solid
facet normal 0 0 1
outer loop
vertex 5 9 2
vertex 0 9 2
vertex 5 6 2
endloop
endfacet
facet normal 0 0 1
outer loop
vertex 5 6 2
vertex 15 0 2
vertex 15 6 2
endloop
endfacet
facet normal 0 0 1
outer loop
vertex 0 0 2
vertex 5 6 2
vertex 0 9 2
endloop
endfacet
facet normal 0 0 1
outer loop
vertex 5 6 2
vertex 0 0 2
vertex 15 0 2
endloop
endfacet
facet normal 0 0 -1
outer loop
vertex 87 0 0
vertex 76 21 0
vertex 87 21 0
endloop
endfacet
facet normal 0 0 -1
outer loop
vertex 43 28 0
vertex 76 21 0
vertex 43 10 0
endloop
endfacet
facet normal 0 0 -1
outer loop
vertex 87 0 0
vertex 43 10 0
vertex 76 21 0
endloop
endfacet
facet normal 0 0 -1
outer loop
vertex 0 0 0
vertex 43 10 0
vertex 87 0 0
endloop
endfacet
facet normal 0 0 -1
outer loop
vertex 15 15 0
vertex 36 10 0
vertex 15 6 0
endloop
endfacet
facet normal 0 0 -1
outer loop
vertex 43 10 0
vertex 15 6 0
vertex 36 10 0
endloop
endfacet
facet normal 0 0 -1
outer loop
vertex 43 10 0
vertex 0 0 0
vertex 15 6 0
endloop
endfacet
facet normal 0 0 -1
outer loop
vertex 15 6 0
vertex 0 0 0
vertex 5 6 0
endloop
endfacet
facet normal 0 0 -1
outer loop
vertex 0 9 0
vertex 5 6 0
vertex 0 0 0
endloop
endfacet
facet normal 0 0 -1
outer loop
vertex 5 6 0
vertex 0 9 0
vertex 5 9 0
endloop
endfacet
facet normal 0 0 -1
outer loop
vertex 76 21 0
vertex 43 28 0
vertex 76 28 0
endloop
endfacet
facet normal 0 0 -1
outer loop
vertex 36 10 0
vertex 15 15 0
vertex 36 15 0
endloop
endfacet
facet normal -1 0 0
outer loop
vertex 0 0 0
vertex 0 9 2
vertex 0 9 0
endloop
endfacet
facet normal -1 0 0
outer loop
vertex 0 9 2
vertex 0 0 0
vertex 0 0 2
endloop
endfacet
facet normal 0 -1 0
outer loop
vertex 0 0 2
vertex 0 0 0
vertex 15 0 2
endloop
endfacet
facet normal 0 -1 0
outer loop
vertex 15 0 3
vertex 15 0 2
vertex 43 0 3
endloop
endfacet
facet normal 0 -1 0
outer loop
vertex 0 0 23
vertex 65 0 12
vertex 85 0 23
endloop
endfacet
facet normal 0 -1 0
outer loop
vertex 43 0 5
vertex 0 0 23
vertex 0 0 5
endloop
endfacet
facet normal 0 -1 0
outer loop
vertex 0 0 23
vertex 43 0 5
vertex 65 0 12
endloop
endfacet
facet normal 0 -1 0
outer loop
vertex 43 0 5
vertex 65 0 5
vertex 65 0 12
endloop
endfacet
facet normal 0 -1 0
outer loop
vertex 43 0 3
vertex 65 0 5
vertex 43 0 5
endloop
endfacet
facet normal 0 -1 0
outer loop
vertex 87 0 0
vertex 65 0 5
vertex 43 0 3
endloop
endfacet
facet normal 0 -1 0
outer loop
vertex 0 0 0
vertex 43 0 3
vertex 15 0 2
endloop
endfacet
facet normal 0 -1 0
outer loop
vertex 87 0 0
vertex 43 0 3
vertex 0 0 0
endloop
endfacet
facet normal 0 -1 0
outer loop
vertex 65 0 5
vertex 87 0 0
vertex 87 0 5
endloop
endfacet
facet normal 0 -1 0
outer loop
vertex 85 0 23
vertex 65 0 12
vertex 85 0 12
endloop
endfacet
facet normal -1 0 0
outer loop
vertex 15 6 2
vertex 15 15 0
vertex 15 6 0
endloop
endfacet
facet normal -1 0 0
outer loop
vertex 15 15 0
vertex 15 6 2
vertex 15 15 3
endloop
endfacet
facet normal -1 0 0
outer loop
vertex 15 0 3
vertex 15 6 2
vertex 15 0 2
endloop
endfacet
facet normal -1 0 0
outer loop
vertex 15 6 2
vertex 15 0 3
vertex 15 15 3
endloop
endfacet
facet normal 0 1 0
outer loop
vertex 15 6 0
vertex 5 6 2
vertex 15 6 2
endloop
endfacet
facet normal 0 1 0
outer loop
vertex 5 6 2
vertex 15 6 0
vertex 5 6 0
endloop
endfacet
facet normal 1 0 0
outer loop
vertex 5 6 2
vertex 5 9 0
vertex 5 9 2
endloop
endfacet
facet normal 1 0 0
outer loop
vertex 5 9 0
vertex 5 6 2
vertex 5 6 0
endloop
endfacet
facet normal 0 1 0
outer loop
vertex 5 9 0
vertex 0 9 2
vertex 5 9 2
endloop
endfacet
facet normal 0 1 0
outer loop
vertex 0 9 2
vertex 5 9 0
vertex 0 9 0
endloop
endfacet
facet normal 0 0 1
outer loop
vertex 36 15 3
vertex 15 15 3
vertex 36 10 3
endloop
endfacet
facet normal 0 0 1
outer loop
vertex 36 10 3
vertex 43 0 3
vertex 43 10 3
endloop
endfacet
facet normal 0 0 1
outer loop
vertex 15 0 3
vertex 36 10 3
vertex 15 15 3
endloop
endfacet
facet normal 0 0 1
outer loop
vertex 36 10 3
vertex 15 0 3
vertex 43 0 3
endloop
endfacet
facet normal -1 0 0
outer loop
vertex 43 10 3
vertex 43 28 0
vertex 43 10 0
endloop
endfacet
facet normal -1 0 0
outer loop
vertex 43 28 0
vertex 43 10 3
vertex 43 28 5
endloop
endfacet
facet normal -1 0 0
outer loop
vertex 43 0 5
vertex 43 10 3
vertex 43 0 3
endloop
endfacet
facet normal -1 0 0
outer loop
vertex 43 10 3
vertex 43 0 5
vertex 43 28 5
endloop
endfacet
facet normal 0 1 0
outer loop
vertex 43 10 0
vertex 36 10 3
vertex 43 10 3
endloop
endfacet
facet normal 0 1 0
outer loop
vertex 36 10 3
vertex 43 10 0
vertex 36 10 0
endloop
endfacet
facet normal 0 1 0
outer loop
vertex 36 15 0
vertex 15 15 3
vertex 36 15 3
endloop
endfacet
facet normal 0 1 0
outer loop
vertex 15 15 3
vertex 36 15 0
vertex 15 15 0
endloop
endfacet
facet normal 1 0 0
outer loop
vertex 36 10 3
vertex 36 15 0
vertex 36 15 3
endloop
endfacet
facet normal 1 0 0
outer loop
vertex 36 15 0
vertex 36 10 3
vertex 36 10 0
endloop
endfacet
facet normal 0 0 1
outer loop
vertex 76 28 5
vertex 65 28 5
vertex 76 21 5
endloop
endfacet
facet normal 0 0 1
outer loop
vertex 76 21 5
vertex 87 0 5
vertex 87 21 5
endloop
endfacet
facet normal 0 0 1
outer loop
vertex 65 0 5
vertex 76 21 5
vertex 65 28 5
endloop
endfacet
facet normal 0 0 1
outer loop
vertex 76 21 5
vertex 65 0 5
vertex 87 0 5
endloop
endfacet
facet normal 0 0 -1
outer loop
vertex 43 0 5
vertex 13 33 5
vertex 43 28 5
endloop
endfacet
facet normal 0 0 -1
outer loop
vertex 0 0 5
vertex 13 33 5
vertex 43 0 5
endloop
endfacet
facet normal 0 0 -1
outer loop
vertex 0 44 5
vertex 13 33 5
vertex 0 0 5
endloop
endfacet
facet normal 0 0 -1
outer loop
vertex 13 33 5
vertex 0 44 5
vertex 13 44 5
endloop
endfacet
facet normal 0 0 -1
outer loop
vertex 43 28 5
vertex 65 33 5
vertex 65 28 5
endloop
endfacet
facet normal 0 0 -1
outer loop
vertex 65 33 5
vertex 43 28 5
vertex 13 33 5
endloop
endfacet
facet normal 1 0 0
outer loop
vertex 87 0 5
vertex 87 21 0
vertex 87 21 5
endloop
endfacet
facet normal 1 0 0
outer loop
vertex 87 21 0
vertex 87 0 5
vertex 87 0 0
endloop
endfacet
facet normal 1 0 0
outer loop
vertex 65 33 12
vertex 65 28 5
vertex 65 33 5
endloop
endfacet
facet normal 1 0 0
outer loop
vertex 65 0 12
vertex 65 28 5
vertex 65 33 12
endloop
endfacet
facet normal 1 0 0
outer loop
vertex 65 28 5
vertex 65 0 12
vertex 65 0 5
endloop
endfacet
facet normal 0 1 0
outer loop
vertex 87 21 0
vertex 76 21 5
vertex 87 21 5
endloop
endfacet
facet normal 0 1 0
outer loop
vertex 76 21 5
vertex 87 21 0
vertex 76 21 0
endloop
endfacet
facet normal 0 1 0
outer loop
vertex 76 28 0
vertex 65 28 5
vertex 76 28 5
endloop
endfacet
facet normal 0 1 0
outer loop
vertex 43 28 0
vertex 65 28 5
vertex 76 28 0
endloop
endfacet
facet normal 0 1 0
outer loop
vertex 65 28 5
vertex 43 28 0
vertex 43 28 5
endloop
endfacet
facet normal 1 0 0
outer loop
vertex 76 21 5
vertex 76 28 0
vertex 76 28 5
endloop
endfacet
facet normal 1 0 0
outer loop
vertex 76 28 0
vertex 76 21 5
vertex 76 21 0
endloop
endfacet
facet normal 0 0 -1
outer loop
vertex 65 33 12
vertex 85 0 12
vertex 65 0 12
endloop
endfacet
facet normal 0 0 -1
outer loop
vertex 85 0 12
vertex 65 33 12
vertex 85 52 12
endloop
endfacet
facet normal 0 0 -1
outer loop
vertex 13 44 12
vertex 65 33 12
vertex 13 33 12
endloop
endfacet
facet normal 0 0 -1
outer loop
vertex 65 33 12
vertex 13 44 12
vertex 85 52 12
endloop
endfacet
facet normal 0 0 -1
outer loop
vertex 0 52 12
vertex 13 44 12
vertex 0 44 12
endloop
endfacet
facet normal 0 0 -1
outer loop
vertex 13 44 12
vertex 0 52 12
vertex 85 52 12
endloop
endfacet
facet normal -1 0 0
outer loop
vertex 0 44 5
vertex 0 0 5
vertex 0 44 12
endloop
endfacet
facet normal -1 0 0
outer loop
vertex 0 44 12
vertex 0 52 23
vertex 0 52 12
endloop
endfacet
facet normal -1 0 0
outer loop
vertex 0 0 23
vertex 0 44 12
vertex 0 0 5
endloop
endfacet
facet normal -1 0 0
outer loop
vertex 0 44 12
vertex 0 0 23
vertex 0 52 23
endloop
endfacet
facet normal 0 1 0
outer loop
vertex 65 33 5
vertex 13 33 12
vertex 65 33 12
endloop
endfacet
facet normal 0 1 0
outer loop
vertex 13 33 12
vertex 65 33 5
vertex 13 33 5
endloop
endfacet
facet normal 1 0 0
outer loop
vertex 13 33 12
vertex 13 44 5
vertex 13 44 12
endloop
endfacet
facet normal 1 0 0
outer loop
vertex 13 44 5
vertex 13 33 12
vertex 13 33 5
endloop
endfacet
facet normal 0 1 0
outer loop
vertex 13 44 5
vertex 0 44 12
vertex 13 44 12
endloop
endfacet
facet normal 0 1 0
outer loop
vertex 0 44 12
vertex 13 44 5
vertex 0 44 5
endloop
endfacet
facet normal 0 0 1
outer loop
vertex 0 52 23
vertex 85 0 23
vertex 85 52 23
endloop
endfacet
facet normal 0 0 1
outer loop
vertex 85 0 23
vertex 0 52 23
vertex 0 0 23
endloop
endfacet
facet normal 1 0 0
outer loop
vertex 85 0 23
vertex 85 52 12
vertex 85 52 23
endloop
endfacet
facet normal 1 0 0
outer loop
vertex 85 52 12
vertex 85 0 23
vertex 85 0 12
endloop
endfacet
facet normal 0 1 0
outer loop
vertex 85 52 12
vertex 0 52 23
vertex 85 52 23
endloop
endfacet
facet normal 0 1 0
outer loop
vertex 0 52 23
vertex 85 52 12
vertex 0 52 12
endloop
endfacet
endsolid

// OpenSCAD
translate([2.5, 1.5, 1.0]) color([0.9720932443736168, 0.4226528937805498, 0.8924289339928592]) cube([5, 3, 2], center=true);
translate([7.5, 1.5, 1.0]) color([0.21652428395276402, 0.4352131794546169, 0.35803513461315506]) cube([5, 3, 2], center=true);
translate([12.5, 1.5, 1.0]) color([0.17693553603496914, 0.32881318575191665, 0.9867958186960467]) cube([5, 3, 2], center=true);
translate([2.5, 4.5, 1.0]) color([0.7473090097951195, 0.3826682791831585, 0.40928443439993156]) cube([5, 3, 2], center=true);
translate([7.5, 4.5, 1.0]) color([0.2637409011550663, 0.531336678598825, 0.7356369121419466]) cube([5, 3, 2], center=true);
translate([12.5, 4.5, 1.0]) color([0.686646615750601, 0.46264983534131954, 0.041939046716157]) cube([5, 3, 2], center=true);
translate([2.5, 7.5, 1.0]) color([0.9215078064992686, 0.4089338030960661, 0.3902988670119316]) cube([5, 3, 2], center=true);
translate([18.5, 2.5, 1.5]) color([0.0031101144891549914, 0.13822721408191307, 0.8688534175006787]) cube([7, 5, 3], center=true);
translate([25.5, 2.5, 1.5]) color([0.513934596181303, 0.7324348442226767, 0.14816788643335854]) cube([7, 5, 3], center=true);
translate([32.5, 2.5, 1.5]) color([0.33005100665524945, 0.8401365565378639, 0.8206585211774247]) cube([7, 5, 3], center=true);
translate([39.5, 2.5, 1.5]) color([0.2467942680862406, 0.021975308333072263, 0.8064669735456029]) cube([7, 5, 3], center=true);
translate([18.5, 7.5, 1.5]) color([0.16884400503942165, 0.7876813921208954, 0.6836592298851071]) cube([7, 5, 3], center=true);
translate([25.5, 7.5, 1.5]) color([0.1683147603108942, 0.0784886436699127, 0.9276494299222889]) cube([7, 5, 3], center=true);
translate([32.5, 7.5, 1.5]) color([0.5978783972833935, 0.620510173056511, 0.4575118028380537]) cube([7, 5, 3], center=true);
translate([39.5, 7.5, 1.5]) color([0.15007097732228858, 0.6019699129465877, 0.2524728800375037]) cube([7, 5, 3], center=true);
translate([18.5, 12.5, 1.5]) color([0.8058946560175415, 0.732718954805416, 0.027267185045511733]) cube([7, 5, 3], center=true);
translate([25.5, 12.5, 1.5]) color([0.9324230096450348, 0.03631604832667812, 0.0896193188307074]) cube([7, 5, 3], center=true);
translate([32.5, 12.5, 1.5]) color([0.2927345609042453, 0.1508090604701401, 0.2361450829166024]) cube([7, 5, 3], center=true);
translate([48.5, 3.5, 2.5]) color([0.3558094886115547, 0.7354997154547138, 0.4047113607648444]) cube([11, 7, 5], center=true);
translate([59.5, 3.5, 2.5]) color([0.2698397547254259, 0.4923131536276696, 0.39259324978876053]) cube([11, 7, 5], center=true);
translate([70.5, 3.5, 2.5]) color([0.310764197486207, 0.900541657866744, 0.5504484509596044]) cube([11, 7, 5], center=true);
translate([81.5, 3.5, 2.5]) color([0.9773275109747672, 0.7729124093934382, 0.570499297619577]) cube([11, 7, 5], center=true);
translate([48.5, 10.5, 2.5]) color([0.26244658927686404, 0.6868436562888387, 0.45591771896977173]) cube([11, 7, 5], center=true);
translate([59.5, 10.5, 2.5]) color([0.7213877150417534, 0.40377880891106155, 0.49600503631794757]) cube([11, 7, 5], center=true);
translate([70.5, 10.5, 2.5]) color([0.02068376744575562, 0.739958502320053, 0.03427354435563068]) cube([11, 7, 5], center=true);
translate([81.5, 10.5, 2.5]) color([0.6807253858476396, 0.5820036955379622, 0.7759176114881267]) cube([11, 7, 5], center=true);
translate([48.5, 17.5, 2.5]) color([0.28977759923741564, 0.6861108151233298, 0.20709797563103816]) cube([11, 7, 5], center=true);
translate([59.5, 17.5, 2.5]) color([0.5292720013578311, 0.34028037925118015, 0.9784545513570129]) cube([11, 7, 5], center=true);
translate([70.5, 17.5, 2.5]) color([0.9718665573793185, 0.20896973547336006, 0.5660382358858294]) cube([11, 7, 5], center=true);
translate([81.5, 17.5, 2.5]) color([0.3294426858782725, 0.9685381870202809, 0.9245259481865659]) cube([11, 7, 5], center=true);
translate([48.5, 24.5, 2.5]) color([0.5861458530564896, 0.7200844551084937, 0.6813247567090696]) cube([11, 7, 5], center=true);
translate([59.5, 24.5, 2.5]) color([0.353355632443361, 0.91636156937516, 0.899453536816357]) cube([11, 7, 5], center=true);
translate([70.5, 24.5, 2.5]) color([0.33065846447807934, 0.7473949106043586, 0.009092126674448586]) cube([11, 7, 5], center=true);
translate([6.5, 5.5, 8.5]) color([0.8163591105584419, 0.5648693453979996, 0.9523067127509502]) cube([13, 11, 7], center=true);
translate([19.5, 5.5, 8.5]) color([0.3631930745481745, 0.6257130749033707, 0.3230024315033787]) cube([13, 11, 7], center=true);
translate([32.5, 5.5, 8.5]) color([0.7827853814039997, 0.6007029967830003, 0.9874710229786893]) cube([13, 11, 7], center=true);
translate([45.5, 5.5, 8.5]) color([0.0010127930964535237, 0.14075874215813544, 0.043601382090813434]) cube([13, 11, 7], center=true);
translate([58.5, 5.5, 8.5]) color([0.1258478488128345, 0.9293852970698306, 0.9486082995058949]) cube([13, 11, 7], center=true);
translate([6.5, 16.5, 8.5]) color([0.4804125346981437, 0.9466893945947962, 0.818387610188399]) cube([13, 11, 7], center=true);
translate([19.5, 16.5, 8.5]) color([0.7786177341461099, 0.747281950803196, 0.18765458516959888]) cube([13, 11, 7], center=true);
translate([32.5, 16.5, 8.5]) color([0.5488772611027803, 0.4238792306088448, 0.949788047597888]) cube([13, 11, 7], center=true);
translate([45.5, 16.5, 8.5]) color([0.17383353806681645, 0.16985884355967462, 0.6588617536380149]) cube([13, 11, 7], center=true);
translate([58.5, 16.5, 8.5]) color([0.15740178957348283, 0.11005367295186075, 0.5039231973300066]) cube([13, 11, 7], center=true);
translate([6.5, 27.5, 8.5]) color([0.796660971220008, 0.6050456716470326, 0.7547539728480395]) cube([13, 11, 7], center=true);
translate([19.5, 27.5, 8.5]) color([0.2657585316255522, 0.28496283302929337, 0.42870364173152453]) cube([13, 11, 7], center=true);
translate([32.5, 27.5, 8.5]) color([0.990847884265713, 0.7179182565245089, 0.9462539572878983]) cube([13, 11, 7], center=true);
translate([45.5, 27.5, 8.5]) color([0.537870455736408, 0.5545598515713968, 0.9900903354753839]) cube([13, 11, 7], center=true);
translate([58.5, 27.5, 8.5]) color([0.18998827565888077, 0.7825904371715813, 0.7915138240285756]) cube([13, 11, 7], center=true);
translate([6.5, 38.5, 8.5]) color([0.8447416276181308, 0.7500527092169327, 0.15533301818854706]) cube([13, 11, 7], center=true);
translate([8.5, 6.5, 17.5]) color([0.661127632121674, 0.9237031845862264, 0.5632851524959844]) cube([17, 13, 11], center=true);
translate([25.5, 6.5, 17.5]) color([0.3609415103802872, 0.9495201486078587, 0.5615986504586717]) cube([17, 13, 11], center=true);
translate([42.5, 6.5, 17.5]) color([0.41163639453549183, 0.6141334980612769, 0.8041250166314531]) cube([17, 13, 11], center=true);
translate([59.5, 6.5, 17.5]) color([0.22830209061365048, 0.01569204302297844, 0.5290948970731422]) cube([17, 13, 11], center=true);
translate([76.5, 6.5, 17.5]) color([0.9413574200758085, 0.6802579626031922, 0.6309080001300065]) cube([17, 13, 11], center=true);
translate([8.5, 19.5, 17.5]) color([0.6278151474899732, 0.4969897122617175, 0.7309192697350546]) cube([17, 13, 11], center=true);
translate([25.5, 19.5, 17.5]) color([0.2491944400337247, 0.891754263952968, 0.2744726552452267]) cube([17, 13, 11], center=true);
translate([42.5, 19.5, 17.5]) color([0.9449450132107339, 0.9264967100320902, 0.07792452404752792]) cube([17, 13, 11], center=true);
translate([59.5, 19.5, 17.5]) color([0.44817970124433604, 0.7440362849370825, 0.44965407150807035]) cube([17, 13, 11], center=true);
translate([76.5, 19.5, 17.5]) color([0.5088990248364155, 0.8068239376717178, 0.7049921609492721]) cube([17, 13, 11], center=true);
translate([8.5, 32.5, 17.5]) color([0.9580042227229432, 0.16448599428307875, 0.9235592861863212]) cube([17, 13, 11], center=true);
translate([25.5, 32.5, 17.5]) color([0.9279862525071727, 0.6347489386405218, 0.9403908272970672]) cube([17, 13, 11], center=true);
translate([42.5, 32.5, 17.5]) color([0.25268558738542024, 0.8817872834036474, 0.7734792929601902]) cube([17, 13, 11], center=true);
translate([59.5, 32.5, 17.5]) color([0.6096889997106941, 0.09062924464806255, 0.030134353730962182]) cube([17, 13, 11], center=true);
translate([76.5, 32.5, 17.5]) color([0.01096949549411852, 0.2505580574481764, 0.7623524099431817]) cube([17, 13, 11], center=true);
translate([8.5, 45.5, 17.5]) color([0.3866250323922331, 0.7754467251552132, 0.6256424909314248]) cube([17, 13, 11], center=true);
translate([25.5, 45.5, 17.5]) color([0.3892618991218443, 0.8801466287862422, 0.03841723935819574]) cube([17, 13, 11], center=true);
translate([42.5, 45.5, 17.5]) color([0.465312990207844, 0.8298523393928158, 0.12681348297309336]) cube([17, 13, 11], center=true);
translate([59.5, 45.5, 17.5]) color([0.7104875615116192, 0.32811584191028165, 0.02430127857694553]) cube([17, 13, 11], center=true);
translate([76.5, 45.5, 17.5]) color([0.4737249308893109, 0.521692738945335, 0.04158625067384558]) cube([17, 13, 11], center=true);
